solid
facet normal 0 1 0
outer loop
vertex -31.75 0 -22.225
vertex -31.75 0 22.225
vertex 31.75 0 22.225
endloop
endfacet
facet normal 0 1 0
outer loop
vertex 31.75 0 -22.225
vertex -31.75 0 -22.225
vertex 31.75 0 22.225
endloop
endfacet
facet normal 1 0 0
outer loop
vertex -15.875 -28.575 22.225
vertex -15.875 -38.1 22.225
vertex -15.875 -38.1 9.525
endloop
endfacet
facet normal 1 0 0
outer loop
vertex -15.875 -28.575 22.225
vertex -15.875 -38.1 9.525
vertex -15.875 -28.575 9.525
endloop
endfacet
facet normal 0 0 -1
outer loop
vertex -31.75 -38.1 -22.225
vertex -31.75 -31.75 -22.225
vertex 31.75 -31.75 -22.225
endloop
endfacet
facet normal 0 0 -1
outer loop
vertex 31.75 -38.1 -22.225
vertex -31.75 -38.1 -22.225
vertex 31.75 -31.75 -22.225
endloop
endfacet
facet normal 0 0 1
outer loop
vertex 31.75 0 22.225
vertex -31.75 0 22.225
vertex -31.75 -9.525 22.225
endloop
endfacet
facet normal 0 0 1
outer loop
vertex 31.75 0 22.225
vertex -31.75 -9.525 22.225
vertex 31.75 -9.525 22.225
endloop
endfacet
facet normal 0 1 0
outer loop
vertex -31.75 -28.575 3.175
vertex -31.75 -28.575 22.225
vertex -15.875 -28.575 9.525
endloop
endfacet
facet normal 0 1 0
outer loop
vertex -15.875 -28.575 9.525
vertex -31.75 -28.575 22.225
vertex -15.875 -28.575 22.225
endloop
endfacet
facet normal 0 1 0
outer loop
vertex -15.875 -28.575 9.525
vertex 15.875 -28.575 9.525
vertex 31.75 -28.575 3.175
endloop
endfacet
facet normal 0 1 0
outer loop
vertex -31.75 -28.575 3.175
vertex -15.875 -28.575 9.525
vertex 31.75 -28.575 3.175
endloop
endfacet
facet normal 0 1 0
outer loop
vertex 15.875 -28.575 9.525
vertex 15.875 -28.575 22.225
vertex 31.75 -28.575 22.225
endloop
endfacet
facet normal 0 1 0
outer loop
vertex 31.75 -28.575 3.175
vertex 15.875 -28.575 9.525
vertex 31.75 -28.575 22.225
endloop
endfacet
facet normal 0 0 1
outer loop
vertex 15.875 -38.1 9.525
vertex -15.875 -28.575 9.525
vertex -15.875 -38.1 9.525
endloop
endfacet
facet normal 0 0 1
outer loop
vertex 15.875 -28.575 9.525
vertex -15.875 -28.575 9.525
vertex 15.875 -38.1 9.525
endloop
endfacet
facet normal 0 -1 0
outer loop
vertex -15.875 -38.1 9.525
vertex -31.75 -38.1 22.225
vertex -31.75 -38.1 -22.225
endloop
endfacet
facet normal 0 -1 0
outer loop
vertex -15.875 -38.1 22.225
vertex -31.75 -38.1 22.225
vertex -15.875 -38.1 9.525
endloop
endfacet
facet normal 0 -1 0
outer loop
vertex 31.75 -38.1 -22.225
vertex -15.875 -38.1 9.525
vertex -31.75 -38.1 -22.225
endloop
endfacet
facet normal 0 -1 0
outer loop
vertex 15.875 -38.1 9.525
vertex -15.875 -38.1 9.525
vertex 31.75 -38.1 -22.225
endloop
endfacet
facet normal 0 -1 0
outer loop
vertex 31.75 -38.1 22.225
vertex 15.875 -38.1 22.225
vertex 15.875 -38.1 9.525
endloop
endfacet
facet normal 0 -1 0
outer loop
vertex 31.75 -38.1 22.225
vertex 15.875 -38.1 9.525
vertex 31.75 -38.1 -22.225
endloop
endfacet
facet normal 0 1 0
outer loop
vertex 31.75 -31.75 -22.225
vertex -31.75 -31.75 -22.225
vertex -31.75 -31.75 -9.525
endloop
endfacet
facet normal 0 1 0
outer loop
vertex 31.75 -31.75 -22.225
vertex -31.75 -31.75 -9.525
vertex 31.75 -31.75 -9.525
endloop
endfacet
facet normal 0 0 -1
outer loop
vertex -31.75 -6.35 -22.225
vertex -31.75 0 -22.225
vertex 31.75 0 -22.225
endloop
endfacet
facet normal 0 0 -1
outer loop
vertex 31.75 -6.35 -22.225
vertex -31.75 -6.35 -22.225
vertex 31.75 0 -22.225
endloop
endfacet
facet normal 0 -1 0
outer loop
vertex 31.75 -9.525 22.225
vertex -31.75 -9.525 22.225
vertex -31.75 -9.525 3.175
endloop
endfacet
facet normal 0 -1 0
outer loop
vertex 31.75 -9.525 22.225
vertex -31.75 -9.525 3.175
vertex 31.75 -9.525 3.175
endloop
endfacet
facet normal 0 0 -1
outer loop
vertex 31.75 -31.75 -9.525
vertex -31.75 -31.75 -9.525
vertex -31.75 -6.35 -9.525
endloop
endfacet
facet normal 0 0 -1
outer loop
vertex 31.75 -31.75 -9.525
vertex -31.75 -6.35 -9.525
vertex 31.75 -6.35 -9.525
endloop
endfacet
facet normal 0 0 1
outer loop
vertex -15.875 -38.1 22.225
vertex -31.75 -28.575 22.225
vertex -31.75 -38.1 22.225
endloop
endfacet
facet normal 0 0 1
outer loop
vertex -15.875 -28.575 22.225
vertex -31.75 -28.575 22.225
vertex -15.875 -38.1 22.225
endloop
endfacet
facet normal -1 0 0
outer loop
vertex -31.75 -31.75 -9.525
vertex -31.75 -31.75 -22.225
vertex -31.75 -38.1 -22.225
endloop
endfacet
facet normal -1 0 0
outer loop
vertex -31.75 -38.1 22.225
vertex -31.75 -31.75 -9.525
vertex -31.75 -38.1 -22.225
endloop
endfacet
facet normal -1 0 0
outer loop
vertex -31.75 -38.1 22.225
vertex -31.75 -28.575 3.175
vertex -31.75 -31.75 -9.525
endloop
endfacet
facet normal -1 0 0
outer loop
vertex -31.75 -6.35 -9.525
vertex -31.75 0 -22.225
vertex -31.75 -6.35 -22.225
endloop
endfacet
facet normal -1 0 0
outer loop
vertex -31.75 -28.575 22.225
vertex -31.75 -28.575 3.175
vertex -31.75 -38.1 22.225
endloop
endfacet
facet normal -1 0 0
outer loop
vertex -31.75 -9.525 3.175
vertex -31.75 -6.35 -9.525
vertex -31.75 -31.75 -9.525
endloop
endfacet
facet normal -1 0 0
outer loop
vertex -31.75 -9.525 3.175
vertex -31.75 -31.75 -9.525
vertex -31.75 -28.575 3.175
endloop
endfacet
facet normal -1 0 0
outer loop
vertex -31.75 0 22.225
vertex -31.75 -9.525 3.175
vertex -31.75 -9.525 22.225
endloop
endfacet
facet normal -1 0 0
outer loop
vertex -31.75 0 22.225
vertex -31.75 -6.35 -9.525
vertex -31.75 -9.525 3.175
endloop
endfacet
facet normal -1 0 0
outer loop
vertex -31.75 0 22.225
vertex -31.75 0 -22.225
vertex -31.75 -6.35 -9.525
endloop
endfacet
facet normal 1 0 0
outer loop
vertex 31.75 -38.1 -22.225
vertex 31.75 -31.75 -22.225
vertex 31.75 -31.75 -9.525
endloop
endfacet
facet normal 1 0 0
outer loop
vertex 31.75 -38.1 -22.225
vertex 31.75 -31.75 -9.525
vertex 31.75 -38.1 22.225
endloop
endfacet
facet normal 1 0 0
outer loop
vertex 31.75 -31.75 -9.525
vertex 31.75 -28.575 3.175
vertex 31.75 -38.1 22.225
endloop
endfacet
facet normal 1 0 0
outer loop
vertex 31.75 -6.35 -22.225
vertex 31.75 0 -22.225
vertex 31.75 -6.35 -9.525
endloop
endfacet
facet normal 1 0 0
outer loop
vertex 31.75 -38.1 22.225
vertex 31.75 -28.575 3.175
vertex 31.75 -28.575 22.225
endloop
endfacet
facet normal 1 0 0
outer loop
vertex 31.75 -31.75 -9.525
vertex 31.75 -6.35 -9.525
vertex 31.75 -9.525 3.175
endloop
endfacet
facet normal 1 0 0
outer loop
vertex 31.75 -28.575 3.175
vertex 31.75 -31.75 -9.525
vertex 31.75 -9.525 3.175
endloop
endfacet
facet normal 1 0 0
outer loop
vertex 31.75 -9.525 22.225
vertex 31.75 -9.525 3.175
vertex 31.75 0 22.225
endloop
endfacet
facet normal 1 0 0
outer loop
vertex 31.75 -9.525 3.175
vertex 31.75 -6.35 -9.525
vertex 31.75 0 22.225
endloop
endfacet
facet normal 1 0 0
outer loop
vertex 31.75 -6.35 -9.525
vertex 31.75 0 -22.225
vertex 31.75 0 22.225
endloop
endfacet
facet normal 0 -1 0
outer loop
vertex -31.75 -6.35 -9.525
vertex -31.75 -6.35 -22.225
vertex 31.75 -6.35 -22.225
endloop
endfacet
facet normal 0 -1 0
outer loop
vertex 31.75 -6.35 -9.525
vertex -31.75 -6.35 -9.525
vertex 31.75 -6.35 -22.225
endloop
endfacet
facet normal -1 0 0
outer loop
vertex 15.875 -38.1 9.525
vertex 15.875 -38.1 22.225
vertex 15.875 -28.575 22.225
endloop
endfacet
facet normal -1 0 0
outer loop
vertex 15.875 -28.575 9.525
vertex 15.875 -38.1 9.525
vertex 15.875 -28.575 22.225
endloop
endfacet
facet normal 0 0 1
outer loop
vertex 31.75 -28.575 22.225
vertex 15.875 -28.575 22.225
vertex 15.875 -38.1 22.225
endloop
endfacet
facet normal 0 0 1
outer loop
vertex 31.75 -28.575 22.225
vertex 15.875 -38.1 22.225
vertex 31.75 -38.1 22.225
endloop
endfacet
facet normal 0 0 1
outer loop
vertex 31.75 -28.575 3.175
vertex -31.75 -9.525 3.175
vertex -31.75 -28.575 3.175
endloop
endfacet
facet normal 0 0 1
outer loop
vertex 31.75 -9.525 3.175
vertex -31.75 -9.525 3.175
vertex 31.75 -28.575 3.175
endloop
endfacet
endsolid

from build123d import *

# Parameters (mm, degrees)
F0_W     = 63.5
F0_H     = 44.45
F1_DEPTH = 38.1
F2_W     = 63.5
F2_H     = 19.05
F3_DEPTH = 19.05
F4_W     = 63.5
F4_H     = 25.4
F5_DEPTH = 12.7
F6_W     = 31.75
F6_H     = 9.525
F7_DEPTH = 12.7


with BuildPart() as f1:
    # F0 (on Front) → F1 (new body)
    with BuildSketch(Plane.XZ):
        Rectangle(F0_W, F0_H)
    extrude(amount=F1_DEPTH)

    # F2 (on face) → F3 (cut)
    with BuildSketch(Plane.XY.offset(22.225)):
        with Locations((0, -19.05)):
            Rectangle(F2_W, F2_H)
    extrude(amount=-F3_DEPTH, mode=Mode.SUBTRACT)

    # F4 (on face) → F5 (cut)
    with BuildSketch(Plane(origin=(0, 0, -22.225), x_dir=(1, 0, 0), z_dir=(0, 0, -1))):
        with Locations((0, 19.05)):
            Rectangle(F4_W, F4_H)
    extrude(amount=-F5_DEPTH, mode=Mode.SUBTRACT)

    # F6 (on face) → F7 (cut)
    with BuildSketch(Plane.XY.offset(22.225)):
        with Locations((0, -33.3375)):
            Rectangle(F6_W, F6_H)
    extrude(amount=-F7_DEPTH, mode=Mode.SUBTRACT)


solid = f1.part
